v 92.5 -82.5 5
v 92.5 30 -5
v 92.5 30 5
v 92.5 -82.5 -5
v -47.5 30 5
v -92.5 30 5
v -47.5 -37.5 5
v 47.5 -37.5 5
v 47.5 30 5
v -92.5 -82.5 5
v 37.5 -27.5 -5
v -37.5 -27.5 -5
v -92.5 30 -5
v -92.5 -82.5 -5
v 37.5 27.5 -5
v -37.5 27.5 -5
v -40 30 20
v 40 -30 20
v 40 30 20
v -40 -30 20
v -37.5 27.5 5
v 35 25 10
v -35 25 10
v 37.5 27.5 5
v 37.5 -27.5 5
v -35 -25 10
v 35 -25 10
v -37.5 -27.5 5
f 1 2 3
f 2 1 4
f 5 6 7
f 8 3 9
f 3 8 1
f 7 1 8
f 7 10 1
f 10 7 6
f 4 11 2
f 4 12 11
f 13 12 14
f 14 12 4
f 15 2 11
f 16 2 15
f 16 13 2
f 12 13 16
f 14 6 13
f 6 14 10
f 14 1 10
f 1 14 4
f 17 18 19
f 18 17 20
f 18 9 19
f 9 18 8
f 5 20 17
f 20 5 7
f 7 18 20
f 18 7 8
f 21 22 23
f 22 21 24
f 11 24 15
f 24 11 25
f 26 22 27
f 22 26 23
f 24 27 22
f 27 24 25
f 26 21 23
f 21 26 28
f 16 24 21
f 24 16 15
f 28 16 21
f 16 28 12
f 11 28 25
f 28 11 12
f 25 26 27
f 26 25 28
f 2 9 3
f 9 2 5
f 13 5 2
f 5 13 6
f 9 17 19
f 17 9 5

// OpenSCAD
module cover(
    area,
    gap,
    attachment,
    thickness
) {
    total_x = area[0] + gap + attachment * 2;
    total_y = area[1] + gap + attachment * 2;
    base_x = area[0] + gap;
    base_y = area[1] + gap;


    difference() {
        union() {

            difference() {
                cube([total_x, total_y, thickness], center=true);
                cube([base_x, base_y, thickness], center=true);
            }
            difference() {
                hull() {
                    translate([0,0,gap])
                    cube([area[0] + thickness, area[1] + thickness, thickness], center=true);
                    cube([base_x + thickness, base_y + thickness, thickness], center=true);
                }
                hull() {
                    translate([0,0,gap - thickness])
                    cube([area[0], area[1], thickness], center=true);
                    cube([base_x - thickness, base_y - thickness, thickness], center=true);
                }
            }
        }
        translate([0, (area[1] + gap + attachment + thickness) / 2, gap / 2])
        #cube([total_x + 10, gap + attachment, gap + thickness + 10], center=true);
    } 
}

cover(
    area = [70, 50],
    gap = 15,
    attachment = 50,
    thickness = 10
);
